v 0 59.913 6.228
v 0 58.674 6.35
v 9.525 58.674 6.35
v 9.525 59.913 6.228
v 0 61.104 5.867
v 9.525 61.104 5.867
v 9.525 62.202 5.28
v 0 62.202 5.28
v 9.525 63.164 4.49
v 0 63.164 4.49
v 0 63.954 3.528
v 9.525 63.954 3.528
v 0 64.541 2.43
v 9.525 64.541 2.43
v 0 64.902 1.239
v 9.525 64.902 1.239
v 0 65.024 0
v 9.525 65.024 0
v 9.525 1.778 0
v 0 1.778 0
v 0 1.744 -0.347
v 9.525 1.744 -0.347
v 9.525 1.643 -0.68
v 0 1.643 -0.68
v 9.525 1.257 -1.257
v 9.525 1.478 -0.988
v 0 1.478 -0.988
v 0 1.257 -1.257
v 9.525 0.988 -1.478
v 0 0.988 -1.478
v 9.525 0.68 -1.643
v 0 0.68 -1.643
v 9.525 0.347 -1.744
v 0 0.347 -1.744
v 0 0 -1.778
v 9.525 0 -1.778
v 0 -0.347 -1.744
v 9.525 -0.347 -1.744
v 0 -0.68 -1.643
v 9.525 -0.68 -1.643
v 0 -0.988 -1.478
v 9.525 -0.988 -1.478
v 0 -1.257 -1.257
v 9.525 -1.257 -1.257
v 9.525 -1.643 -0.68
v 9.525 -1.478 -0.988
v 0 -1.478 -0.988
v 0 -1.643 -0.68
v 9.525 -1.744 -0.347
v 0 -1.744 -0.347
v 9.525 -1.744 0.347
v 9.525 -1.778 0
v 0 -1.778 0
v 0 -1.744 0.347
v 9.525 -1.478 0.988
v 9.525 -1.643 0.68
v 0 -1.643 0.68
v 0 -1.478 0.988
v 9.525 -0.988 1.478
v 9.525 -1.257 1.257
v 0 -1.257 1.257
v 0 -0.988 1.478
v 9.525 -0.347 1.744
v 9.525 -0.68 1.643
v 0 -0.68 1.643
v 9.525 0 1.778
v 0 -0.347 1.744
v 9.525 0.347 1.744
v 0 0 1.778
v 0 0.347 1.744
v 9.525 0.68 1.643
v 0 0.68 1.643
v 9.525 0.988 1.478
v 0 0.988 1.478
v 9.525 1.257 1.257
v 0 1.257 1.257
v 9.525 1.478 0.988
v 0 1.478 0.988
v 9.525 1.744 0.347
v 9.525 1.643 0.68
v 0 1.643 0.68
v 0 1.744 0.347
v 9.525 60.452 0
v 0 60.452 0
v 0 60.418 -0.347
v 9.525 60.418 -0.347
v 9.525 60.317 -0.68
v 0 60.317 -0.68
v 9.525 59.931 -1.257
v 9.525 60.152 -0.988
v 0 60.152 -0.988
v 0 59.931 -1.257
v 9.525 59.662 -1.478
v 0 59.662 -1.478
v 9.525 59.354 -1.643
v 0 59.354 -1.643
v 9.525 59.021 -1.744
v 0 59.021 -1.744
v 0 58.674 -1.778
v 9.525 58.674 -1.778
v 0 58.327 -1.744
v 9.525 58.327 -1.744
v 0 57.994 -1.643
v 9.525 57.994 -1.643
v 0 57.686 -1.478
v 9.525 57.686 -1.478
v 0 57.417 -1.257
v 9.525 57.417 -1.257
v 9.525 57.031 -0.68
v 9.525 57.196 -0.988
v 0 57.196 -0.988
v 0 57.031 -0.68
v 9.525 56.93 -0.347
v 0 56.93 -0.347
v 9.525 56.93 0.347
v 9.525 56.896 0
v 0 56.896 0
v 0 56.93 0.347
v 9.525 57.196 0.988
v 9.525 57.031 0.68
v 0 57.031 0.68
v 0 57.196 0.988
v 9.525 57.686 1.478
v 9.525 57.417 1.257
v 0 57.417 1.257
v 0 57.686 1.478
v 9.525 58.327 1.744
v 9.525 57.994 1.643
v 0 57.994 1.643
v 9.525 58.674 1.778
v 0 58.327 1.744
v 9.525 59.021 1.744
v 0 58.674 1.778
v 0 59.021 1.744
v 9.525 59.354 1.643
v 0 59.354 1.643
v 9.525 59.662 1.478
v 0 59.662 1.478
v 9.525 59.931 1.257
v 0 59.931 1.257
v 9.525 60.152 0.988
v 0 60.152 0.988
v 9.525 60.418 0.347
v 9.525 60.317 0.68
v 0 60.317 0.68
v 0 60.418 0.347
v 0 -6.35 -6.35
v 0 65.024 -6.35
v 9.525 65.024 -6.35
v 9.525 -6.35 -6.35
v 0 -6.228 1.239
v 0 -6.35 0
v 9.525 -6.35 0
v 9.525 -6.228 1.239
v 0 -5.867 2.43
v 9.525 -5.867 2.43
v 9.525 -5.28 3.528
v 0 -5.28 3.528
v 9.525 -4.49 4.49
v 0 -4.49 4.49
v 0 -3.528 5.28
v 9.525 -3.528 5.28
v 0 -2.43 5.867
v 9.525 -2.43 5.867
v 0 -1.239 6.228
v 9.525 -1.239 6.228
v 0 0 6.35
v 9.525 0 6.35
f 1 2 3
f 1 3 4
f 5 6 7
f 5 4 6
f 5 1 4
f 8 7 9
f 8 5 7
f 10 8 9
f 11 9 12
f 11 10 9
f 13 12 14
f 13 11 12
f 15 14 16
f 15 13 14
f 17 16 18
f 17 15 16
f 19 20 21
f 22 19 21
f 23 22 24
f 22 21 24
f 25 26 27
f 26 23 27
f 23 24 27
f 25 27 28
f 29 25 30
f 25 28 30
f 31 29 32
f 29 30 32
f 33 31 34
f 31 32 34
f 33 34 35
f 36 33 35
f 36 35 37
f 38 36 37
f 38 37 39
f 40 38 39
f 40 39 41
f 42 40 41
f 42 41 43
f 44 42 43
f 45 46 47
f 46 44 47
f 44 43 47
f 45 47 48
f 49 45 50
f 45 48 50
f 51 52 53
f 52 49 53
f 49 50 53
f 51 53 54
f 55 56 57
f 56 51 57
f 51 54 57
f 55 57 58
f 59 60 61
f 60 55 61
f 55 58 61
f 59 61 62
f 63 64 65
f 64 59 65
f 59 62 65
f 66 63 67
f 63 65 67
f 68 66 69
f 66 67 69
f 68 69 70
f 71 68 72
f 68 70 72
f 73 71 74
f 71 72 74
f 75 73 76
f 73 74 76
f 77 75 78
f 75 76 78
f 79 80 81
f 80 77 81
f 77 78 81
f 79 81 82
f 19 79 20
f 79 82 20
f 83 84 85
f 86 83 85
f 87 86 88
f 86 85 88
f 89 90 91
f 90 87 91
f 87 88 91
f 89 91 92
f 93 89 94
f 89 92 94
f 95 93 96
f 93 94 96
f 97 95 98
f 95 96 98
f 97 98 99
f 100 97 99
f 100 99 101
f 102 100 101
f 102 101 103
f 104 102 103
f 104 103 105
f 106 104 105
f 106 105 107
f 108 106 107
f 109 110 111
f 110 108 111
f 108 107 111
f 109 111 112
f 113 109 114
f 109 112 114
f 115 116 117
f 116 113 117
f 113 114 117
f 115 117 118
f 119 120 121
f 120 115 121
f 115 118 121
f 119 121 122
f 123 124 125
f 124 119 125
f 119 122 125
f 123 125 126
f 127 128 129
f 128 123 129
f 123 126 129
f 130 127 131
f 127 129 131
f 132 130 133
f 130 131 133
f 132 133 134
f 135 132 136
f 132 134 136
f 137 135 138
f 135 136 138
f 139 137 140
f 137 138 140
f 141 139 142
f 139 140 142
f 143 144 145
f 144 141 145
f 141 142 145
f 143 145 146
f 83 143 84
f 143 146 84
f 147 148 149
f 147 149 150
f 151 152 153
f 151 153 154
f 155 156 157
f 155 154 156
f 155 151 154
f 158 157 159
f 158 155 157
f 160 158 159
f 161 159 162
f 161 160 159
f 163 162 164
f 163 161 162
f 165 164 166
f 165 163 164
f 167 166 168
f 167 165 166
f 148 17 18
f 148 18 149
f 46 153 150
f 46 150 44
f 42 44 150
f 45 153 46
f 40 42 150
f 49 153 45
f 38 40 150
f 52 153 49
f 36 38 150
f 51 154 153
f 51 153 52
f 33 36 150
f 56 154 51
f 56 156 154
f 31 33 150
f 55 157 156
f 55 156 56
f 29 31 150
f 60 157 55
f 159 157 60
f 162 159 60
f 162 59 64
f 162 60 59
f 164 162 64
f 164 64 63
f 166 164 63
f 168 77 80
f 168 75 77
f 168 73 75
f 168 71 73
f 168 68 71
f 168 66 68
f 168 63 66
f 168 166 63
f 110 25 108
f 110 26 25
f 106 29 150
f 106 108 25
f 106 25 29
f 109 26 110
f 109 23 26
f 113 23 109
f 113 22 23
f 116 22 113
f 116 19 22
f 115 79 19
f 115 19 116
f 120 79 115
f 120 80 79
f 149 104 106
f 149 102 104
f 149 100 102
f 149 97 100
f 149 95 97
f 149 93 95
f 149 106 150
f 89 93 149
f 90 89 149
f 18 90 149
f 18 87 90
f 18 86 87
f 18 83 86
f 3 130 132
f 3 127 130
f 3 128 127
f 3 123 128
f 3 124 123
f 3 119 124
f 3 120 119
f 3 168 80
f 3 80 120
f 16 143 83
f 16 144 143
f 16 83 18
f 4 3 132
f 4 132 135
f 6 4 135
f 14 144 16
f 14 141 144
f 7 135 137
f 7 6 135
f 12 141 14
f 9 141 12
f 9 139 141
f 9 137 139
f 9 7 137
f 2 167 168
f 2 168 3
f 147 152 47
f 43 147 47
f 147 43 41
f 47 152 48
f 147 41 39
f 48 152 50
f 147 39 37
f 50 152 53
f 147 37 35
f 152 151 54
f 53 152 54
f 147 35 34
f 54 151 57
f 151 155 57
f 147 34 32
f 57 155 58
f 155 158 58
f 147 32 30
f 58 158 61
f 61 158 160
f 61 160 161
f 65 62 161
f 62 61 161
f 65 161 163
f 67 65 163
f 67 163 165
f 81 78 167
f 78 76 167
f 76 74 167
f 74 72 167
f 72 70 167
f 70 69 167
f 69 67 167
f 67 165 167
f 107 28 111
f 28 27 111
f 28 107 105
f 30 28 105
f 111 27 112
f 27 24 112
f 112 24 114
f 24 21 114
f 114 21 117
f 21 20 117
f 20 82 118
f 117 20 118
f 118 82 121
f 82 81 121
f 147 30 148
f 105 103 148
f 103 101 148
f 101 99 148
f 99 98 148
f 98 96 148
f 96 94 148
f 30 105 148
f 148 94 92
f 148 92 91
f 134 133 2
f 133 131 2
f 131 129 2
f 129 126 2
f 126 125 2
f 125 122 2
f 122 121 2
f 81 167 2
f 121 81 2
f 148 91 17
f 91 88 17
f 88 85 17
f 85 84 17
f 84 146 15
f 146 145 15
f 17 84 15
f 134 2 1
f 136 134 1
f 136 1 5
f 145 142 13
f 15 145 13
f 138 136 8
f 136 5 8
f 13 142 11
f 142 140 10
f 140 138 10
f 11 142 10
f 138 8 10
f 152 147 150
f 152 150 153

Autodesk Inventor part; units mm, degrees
ref_plane "YZ Plane" through (0, 0, 0) normal (1, 0, 0) x (0, 1, 0)
ref_plane "XZ Plane" through (0, 0, 0) normal (0, 1, 0) x (-1, 0, 0)
ref_plane "XY Plane" through (0, 0, 0) normal (0, 0, 1) x (1, 0, 0)
sketch "Sketch1" plane through (0, 0, 0) normal (1, 0, 0) x (0, 1, 0)
  circle A0 centre (0, 0) radius 1.778
  circle A1 centre (58.674, 0) radius 1.778
  line L0 (65.024, -6.35) -> (-6.35, -6.35)
  line L1 (-6.35, -6.35) -> (-6.35, 0)
  line L2 (0, 6.35) -> (58.674, 6.35)
  line L3 (65.024, 0) -> (65.024, -6.35)
  arc A2 (0, 6.35) -> (-6.35, 0) centre (0, 0) ccw
  arc A3 (65.024, 0) -> (58.674, 6.35) centre (58.674, 0) ccw
  dimension "d0" = 3.556
  dimension "d1" = 3.556
  dimension "d2" = 58.674
  dimension "d3" = 6.35
  dimension "d4" = 12.7
  dimension "d5" = 6.35
  dimension "d6" = 6.35
  dimension "d8" = 6.35
extrude "Extrusion1" add sketch "Sketch1" along normal blind 9.525
properties part number "Base"
